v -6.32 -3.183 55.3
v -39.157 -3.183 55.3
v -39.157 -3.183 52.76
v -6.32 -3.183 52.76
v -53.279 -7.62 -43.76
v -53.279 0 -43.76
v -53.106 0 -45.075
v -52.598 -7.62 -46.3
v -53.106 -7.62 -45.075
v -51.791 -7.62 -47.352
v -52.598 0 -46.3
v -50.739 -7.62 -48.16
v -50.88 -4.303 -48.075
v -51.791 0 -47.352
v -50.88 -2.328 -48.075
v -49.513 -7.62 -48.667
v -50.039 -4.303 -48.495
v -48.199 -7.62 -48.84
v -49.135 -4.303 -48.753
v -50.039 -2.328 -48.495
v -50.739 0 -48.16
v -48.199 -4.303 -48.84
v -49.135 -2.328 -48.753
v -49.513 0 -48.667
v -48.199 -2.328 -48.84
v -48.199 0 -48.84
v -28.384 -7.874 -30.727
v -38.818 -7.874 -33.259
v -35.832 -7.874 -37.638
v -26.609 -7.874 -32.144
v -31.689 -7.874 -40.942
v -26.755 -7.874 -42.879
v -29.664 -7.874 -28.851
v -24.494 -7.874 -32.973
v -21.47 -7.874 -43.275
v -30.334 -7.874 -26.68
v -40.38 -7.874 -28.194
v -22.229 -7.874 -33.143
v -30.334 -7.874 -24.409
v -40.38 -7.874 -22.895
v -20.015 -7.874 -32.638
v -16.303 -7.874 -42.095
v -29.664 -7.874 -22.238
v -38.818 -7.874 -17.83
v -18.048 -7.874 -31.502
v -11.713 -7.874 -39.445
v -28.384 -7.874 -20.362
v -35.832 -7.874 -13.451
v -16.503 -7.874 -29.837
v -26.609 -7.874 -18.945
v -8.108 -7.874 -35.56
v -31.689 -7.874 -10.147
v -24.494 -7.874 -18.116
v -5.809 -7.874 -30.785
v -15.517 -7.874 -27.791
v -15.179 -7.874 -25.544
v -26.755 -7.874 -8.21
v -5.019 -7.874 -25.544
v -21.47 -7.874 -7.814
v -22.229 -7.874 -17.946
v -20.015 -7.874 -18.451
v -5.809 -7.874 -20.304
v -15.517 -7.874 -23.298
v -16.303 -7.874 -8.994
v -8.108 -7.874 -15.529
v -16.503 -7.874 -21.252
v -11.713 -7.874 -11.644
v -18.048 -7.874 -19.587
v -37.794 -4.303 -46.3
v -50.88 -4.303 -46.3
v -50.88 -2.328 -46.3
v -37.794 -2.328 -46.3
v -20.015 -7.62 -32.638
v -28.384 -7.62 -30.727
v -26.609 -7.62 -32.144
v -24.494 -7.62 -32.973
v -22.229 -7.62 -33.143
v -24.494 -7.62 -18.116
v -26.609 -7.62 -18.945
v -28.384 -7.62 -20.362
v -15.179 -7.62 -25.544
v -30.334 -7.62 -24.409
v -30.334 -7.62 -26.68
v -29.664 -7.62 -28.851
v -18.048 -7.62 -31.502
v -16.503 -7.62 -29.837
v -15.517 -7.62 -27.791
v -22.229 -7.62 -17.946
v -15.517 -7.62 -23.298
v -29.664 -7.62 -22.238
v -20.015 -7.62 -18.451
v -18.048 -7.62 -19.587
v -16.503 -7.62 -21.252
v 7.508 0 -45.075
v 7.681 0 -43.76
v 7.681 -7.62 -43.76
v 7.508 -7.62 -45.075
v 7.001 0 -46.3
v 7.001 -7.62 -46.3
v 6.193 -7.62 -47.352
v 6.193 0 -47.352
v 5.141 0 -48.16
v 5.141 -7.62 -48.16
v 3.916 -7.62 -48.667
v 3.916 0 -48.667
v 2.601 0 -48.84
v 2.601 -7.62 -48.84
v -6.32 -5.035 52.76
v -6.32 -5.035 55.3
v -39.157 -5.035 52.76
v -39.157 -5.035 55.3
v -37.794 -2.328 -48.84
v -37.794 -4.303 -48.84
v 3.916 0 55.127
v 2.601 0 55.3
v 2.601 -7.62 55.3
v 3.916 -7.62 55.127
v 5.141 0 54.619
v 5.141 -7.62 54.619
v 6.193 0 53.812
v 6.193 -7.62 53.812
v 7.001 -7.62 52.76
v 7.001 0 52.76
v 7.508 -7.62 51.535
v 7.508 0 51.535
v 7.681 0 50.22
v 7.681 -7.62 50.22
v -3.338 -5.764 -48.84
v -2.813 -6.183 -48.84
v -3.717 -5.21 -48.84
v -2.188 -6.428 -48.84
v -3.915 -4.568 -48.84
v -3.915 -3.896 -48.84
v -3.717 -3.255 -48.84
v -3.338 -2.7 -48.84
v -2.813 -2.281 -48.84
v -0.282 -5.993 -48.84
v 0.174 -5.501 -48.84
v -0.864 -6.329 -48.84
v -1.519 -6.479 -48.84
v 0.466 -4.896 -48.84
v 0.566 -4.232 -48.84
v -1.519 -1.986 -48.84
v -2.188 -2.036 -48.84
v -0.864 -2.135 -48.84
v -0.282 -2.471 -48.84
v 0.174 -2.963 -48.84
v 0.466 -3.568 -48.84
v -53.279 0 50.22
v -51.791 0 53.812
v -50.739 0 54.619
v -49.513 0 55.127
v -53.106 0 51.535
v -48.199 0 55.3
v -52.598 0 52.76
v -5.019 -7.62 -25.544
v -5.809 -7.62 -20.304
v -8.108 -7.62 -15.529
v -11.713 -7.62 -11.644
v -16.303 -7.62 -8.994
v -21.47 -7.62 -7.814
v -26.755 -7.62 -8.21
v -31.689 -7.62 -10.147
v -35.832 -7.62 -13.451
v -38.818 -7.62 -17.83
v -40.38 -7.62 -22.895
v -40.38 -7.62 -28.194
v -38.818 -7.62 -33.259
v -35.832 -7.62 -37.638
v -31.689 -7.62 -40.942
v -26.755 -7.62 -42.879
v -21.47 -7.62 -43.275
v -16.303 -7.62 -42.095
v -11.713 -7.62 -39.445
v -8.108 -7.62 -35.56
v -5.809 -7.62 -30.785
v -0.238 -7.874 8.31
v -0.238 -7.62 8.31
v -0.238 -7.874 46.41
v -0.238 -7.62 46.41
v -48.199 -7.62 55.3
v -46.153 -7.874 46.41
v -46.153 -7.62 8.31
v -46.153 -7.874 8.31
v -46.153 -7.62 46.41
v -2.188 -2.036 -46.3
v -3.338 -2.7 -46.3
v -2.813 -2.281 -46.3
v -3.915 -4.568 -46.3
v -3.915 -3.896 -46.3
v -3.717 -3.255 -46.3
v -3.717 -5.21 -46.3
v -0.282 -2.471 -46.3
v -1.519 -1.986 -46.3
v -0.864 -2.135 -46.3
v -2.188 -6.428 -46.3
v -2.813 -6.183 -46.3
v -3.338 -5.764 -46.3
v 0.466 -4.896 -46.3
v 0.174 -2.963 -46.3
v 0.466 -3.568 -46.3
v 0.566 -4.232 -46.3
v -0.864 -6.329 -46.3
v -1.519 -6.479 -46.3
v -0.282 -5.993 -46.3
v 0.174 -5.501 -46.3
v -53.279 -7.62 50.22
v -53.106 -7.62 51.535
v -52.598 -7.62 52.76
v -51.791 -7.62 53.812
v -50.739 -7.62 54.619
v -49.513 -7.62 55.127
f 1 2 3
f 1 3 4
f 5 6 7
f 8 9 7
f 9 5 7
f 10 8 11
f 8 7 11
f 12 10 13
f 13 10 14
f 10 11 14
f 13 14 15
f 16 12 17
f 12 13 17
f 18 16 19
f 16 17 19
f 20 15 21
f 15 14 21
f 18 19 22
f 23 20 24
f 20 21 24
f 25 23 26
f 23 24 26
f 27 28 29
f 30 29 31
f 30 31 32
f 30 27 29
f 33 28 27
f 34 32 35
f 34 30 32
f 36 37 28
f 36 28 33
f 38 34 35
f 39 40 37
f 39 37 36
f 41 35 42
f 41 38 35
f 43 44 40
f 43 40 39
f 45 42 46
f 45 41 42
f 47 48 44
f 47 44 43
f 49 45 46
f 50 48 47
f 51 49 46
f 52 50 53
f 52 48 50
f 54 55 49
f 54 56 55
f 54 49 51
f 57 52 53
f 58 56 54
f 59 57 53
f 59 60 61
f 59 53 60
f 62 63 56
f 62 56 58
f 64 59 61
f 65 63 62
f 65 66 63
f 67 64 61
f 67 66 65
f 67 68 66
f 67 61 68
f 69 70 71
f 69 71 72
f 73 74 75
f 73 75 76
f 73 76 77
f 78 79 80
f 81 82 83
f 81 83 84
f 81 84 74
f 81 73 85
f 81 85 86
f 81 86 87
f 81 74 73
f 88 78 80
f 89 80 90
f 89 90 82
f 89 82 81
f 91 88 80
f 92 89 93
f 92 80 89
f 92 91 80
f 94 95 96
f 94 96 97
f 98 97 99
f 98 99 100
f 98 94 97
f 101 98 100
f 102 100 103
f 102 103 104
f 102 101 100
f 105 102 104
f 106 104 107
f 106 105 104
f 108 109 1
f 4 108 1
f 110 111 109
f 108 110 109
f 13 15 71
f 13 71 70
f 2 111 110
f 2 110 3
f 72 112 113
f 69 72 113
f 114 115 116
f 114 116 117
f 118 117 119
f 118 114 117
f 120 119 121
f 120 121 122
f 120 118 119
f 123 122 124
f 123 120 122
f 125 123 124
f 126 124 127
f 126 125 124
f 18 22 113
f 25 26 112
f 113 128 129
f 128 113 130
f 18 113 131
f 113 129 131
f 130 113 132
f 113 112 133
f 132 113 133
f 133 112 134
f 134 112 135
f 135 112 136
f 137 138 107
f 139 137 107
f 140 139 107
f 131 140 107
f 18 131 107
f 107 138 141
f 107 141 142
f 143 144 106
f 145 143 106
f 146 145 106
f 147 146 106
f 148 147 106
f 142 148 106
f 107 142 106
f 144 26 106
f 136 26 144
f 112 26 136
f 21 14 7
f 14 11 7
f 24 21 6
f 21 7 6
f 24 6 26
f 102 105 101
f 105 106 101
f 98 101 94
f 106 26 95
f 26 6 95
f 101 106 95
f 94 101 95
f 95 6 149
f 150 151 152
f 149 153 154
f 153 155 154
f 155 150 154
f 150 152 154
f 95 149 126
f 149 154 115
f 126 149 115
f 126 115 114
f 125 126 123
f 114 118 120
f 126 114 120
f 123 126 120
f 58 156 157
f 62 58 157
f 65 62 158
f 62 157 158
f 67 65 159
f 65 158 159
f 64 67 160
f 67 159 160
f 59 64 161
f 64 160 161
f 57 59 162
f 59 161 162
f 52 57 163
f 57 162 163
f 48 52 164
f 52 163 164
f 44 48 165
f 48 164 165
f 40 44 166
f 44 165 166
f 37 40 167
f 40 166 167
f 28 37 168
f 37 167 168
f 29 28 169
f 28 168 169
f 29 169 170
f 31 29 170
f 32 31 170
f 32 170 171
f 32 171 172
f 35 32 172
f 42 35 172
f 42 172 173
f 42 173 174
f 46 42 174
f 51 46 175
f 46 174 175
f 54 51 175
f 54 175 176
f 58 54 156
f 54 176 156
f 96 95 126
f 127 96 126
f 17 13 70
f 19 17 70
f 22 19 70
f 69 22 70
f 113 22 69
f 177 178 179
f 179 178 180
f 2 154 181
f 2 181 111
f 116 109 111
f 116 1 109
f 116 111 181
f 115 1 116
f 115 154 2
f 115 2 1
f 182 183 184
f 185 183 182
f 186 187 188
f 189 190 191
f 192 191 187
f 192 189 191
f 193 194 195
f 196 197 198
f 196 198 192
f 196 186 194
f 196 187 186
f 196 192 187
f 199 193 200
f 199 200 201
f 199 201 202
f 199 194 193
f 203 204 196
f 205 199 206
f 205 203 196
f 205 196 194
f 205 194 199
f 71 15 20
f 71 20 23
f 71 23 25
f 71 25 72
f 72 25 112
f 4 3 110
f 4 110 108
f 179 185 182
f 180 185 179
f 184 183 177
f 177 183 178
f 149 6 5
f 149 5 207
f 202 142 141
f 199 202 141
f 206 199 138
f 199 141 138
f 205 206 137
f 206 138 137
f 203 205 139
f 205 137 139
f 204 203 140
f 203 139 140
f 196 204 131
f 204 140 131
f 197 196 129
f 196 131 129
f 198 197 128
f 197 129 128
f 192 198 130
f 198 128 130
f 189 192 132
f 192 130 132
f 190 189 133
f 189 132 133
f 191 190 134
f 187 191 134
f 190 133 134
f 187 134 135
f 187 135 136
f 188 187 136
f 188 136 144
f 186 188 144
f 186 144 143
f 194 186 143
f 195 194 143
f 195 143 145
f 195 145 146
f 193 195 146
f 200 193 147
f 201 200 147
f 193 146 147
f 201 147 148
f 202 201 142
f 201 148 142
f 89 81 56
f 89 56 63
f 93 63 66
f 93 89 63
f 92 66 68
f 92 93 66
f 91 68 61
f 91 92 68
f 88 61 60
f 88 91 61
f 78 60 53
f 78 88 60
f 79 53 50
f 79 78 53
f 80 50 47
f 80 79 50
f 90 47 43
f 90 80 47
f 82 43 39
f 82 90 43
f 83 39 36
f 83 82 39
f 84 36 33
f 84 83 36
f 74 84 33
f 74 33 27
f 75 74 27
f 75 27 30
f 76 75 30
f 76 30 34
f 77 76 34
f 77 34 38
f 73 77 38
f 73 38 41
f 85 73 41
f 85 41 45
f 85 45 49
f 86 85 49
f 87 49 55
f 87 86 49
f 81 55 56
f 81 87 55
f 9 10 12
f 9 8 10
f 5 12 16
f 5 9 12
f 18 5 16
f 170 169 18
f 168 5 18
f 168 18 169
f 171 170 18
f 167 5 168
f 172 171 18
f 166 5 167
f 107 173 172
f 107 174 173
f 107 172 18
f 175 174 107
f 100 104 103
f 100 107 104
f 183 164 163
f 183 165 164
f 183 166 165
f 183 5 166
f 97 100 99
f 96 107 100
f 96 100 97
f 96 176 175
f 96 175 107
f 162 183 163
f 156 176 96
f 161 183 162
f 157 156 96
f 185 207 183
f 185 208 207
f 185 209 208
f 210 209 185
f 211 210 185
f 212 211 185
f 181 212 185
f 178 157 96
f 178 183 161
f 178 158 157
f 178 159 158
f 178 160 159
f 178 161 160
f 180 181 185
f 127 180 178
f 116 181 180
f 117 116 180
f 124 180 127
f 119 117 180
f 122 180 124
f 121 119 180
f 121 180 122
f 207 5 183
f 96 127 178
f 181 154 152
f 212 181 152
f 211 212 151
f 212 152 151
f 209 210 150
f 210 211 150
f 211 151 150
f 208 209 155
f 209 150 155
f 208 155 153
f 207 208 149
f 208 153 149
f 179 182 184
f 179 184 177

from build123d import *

# Parameters (mm, degrees)
F0_W        = 60.96
F0_H        = 104.14
F1_DEPTH    = 7.62
F2_W        = 45.9153815961
F2_H        = 38.1
F2_R        = 17.78
F2_R_2      = 7.62
F3_DEPTH    = 0.254
F4_W        = 13.0856782198
F4_H        = 1.975195948
F5_DEPTH    = 2.54
F6_R        = 2.2527466913
F7_DEPTH    = 2.54
F8_T1_DEPTH = 33.02
F9_W        = 32.8376358375
F9_H        = 1.8517468125
F10_DEPTH   = 2.54


# Not quite as in the source:
# - a fillet or chamfer that OpenCascade refuses, or shapes differently, is made with other operations: its cross-section is extruded or revolved along the edge and cut away or added


with BuildPart() as f1:
    # F0 (on Front) → F1 (new body)
    with BuildSketch(Plane.XZ):
        with Locations((-22.7986111199, 3.2297596335)):
            Rectangle(F0_W, F0_H)
    extrude(amount=F1_DEPTH)

    # F2 (on face) → F3 (join)
    with BuildSketch(Plane.XZ.offset(7.62)):
        with Locations((-23.1955593918, 27.3597596335)):
            Rectangle(F2_W, F2_H)
        with Locations((-22.7986111199, -25.5444776267)):
            Circle(F2_R)
        with Locations((-22.7986111199, -25.5444776267)):
            Circle(F2_R_2, mode=Mode.SUBTRACT)
    extrude(amount=F3_DEPTH)

    # F4 (on face) → F5 (cut)
    with BuildSketch(Plane(origin=(0, 0, -48.8402403665), x_dir=(1, 0, 0), z_dir=(0, 0, -1))):
        with Locations((-44.3373024464, 3.3156641293)):
            Rectangle(F4_W, F4_H)
    extrude(amount=-F5_DEPTH, mode=Mode.SUBTRACT)

    # F6 (on face) → F7 (cut)
    with BuildSketch(Plane(origin=(0, 0, -48.8402403665), x_dir=(1, 0, 0), z_dir=(0, 0, -1))):
        with Locations((-1.6869211104, 4.2321491055)):
            Circle(F6_R)
    extrude(amount=-F7_DEPTH, mode=Mode.SUBTRACT)

    # F8: fillet of radius 5.08 on 4 edges, made by hand

    # F8_s2 → F8_t1 (cut)
    with BuildSketch(Plane.XZ.offset(-12.7)):
        with BuildLine():
            ThreePointArc((2.6013888801, 55.2997596335), (6.1934913285, 53.811862082), (7.6813888801, 50.2197596335))
            Line((7.6813888801, 50.2197596335), (7.6813888801, 55.2997596335))
            Line((7.6813888801, 55.2997596335), (2.6013888801, 55.2997596335))
        make_face()
        with BuildLine():
            ThreePointArc((-48.1986111199, 55.2997596335), (-51.7907135683, 53.811862082), (-53.2786111199, 50.2197596335))
            Line((-53.2786111199, 50.2197596335), (-53.2786111199, 55.2997596335))
            Line((-53.2786111199, 55.2997596335), (-48.1986111199, 55.2997596335))
        make_face()
        with BuildLine():
            ThreePointArc((7.6813888801, -43.7602403665), (6.1934913285, -47.3523428149), (2.6013888801, -48.8402403665))
            Line((2.6013888801, -48.8402403665), (7.6813888801, -48.8402403665))
            Line((7.6813888801, -48.8402403665), (7.6813888801, -43.7602403665))
        make_face()
        with BuildLine():
            ThreePointArc((-53.2786111199, -43.7602403665), (-51.7907135683, -47.3523428149), (-48.1986111199, -48.8402403665))
            Line((-48.1986111199, -48.8402403665), (-53.2786111199, -48.8402403665))
            Line((-53.2786111199, -48.8402403665), (-53.2786111199, -43.7602403665))
        make_face()
    extrude(amount=F8_T1_DEPTH, mode=Mode.SUBTRACT)

    # F9 (on face) → F10 (cut)
    with BuildSketch(Plane.XY.offset(55.2997596335)):
        with Locations((-22.7386062033, -4.1089197621)):
            Rectangle(F9_W, F9_H)
    extrude(amount=-F10_DEPTH, mode=Mode.SUBTRACT)


solid = f1.part
